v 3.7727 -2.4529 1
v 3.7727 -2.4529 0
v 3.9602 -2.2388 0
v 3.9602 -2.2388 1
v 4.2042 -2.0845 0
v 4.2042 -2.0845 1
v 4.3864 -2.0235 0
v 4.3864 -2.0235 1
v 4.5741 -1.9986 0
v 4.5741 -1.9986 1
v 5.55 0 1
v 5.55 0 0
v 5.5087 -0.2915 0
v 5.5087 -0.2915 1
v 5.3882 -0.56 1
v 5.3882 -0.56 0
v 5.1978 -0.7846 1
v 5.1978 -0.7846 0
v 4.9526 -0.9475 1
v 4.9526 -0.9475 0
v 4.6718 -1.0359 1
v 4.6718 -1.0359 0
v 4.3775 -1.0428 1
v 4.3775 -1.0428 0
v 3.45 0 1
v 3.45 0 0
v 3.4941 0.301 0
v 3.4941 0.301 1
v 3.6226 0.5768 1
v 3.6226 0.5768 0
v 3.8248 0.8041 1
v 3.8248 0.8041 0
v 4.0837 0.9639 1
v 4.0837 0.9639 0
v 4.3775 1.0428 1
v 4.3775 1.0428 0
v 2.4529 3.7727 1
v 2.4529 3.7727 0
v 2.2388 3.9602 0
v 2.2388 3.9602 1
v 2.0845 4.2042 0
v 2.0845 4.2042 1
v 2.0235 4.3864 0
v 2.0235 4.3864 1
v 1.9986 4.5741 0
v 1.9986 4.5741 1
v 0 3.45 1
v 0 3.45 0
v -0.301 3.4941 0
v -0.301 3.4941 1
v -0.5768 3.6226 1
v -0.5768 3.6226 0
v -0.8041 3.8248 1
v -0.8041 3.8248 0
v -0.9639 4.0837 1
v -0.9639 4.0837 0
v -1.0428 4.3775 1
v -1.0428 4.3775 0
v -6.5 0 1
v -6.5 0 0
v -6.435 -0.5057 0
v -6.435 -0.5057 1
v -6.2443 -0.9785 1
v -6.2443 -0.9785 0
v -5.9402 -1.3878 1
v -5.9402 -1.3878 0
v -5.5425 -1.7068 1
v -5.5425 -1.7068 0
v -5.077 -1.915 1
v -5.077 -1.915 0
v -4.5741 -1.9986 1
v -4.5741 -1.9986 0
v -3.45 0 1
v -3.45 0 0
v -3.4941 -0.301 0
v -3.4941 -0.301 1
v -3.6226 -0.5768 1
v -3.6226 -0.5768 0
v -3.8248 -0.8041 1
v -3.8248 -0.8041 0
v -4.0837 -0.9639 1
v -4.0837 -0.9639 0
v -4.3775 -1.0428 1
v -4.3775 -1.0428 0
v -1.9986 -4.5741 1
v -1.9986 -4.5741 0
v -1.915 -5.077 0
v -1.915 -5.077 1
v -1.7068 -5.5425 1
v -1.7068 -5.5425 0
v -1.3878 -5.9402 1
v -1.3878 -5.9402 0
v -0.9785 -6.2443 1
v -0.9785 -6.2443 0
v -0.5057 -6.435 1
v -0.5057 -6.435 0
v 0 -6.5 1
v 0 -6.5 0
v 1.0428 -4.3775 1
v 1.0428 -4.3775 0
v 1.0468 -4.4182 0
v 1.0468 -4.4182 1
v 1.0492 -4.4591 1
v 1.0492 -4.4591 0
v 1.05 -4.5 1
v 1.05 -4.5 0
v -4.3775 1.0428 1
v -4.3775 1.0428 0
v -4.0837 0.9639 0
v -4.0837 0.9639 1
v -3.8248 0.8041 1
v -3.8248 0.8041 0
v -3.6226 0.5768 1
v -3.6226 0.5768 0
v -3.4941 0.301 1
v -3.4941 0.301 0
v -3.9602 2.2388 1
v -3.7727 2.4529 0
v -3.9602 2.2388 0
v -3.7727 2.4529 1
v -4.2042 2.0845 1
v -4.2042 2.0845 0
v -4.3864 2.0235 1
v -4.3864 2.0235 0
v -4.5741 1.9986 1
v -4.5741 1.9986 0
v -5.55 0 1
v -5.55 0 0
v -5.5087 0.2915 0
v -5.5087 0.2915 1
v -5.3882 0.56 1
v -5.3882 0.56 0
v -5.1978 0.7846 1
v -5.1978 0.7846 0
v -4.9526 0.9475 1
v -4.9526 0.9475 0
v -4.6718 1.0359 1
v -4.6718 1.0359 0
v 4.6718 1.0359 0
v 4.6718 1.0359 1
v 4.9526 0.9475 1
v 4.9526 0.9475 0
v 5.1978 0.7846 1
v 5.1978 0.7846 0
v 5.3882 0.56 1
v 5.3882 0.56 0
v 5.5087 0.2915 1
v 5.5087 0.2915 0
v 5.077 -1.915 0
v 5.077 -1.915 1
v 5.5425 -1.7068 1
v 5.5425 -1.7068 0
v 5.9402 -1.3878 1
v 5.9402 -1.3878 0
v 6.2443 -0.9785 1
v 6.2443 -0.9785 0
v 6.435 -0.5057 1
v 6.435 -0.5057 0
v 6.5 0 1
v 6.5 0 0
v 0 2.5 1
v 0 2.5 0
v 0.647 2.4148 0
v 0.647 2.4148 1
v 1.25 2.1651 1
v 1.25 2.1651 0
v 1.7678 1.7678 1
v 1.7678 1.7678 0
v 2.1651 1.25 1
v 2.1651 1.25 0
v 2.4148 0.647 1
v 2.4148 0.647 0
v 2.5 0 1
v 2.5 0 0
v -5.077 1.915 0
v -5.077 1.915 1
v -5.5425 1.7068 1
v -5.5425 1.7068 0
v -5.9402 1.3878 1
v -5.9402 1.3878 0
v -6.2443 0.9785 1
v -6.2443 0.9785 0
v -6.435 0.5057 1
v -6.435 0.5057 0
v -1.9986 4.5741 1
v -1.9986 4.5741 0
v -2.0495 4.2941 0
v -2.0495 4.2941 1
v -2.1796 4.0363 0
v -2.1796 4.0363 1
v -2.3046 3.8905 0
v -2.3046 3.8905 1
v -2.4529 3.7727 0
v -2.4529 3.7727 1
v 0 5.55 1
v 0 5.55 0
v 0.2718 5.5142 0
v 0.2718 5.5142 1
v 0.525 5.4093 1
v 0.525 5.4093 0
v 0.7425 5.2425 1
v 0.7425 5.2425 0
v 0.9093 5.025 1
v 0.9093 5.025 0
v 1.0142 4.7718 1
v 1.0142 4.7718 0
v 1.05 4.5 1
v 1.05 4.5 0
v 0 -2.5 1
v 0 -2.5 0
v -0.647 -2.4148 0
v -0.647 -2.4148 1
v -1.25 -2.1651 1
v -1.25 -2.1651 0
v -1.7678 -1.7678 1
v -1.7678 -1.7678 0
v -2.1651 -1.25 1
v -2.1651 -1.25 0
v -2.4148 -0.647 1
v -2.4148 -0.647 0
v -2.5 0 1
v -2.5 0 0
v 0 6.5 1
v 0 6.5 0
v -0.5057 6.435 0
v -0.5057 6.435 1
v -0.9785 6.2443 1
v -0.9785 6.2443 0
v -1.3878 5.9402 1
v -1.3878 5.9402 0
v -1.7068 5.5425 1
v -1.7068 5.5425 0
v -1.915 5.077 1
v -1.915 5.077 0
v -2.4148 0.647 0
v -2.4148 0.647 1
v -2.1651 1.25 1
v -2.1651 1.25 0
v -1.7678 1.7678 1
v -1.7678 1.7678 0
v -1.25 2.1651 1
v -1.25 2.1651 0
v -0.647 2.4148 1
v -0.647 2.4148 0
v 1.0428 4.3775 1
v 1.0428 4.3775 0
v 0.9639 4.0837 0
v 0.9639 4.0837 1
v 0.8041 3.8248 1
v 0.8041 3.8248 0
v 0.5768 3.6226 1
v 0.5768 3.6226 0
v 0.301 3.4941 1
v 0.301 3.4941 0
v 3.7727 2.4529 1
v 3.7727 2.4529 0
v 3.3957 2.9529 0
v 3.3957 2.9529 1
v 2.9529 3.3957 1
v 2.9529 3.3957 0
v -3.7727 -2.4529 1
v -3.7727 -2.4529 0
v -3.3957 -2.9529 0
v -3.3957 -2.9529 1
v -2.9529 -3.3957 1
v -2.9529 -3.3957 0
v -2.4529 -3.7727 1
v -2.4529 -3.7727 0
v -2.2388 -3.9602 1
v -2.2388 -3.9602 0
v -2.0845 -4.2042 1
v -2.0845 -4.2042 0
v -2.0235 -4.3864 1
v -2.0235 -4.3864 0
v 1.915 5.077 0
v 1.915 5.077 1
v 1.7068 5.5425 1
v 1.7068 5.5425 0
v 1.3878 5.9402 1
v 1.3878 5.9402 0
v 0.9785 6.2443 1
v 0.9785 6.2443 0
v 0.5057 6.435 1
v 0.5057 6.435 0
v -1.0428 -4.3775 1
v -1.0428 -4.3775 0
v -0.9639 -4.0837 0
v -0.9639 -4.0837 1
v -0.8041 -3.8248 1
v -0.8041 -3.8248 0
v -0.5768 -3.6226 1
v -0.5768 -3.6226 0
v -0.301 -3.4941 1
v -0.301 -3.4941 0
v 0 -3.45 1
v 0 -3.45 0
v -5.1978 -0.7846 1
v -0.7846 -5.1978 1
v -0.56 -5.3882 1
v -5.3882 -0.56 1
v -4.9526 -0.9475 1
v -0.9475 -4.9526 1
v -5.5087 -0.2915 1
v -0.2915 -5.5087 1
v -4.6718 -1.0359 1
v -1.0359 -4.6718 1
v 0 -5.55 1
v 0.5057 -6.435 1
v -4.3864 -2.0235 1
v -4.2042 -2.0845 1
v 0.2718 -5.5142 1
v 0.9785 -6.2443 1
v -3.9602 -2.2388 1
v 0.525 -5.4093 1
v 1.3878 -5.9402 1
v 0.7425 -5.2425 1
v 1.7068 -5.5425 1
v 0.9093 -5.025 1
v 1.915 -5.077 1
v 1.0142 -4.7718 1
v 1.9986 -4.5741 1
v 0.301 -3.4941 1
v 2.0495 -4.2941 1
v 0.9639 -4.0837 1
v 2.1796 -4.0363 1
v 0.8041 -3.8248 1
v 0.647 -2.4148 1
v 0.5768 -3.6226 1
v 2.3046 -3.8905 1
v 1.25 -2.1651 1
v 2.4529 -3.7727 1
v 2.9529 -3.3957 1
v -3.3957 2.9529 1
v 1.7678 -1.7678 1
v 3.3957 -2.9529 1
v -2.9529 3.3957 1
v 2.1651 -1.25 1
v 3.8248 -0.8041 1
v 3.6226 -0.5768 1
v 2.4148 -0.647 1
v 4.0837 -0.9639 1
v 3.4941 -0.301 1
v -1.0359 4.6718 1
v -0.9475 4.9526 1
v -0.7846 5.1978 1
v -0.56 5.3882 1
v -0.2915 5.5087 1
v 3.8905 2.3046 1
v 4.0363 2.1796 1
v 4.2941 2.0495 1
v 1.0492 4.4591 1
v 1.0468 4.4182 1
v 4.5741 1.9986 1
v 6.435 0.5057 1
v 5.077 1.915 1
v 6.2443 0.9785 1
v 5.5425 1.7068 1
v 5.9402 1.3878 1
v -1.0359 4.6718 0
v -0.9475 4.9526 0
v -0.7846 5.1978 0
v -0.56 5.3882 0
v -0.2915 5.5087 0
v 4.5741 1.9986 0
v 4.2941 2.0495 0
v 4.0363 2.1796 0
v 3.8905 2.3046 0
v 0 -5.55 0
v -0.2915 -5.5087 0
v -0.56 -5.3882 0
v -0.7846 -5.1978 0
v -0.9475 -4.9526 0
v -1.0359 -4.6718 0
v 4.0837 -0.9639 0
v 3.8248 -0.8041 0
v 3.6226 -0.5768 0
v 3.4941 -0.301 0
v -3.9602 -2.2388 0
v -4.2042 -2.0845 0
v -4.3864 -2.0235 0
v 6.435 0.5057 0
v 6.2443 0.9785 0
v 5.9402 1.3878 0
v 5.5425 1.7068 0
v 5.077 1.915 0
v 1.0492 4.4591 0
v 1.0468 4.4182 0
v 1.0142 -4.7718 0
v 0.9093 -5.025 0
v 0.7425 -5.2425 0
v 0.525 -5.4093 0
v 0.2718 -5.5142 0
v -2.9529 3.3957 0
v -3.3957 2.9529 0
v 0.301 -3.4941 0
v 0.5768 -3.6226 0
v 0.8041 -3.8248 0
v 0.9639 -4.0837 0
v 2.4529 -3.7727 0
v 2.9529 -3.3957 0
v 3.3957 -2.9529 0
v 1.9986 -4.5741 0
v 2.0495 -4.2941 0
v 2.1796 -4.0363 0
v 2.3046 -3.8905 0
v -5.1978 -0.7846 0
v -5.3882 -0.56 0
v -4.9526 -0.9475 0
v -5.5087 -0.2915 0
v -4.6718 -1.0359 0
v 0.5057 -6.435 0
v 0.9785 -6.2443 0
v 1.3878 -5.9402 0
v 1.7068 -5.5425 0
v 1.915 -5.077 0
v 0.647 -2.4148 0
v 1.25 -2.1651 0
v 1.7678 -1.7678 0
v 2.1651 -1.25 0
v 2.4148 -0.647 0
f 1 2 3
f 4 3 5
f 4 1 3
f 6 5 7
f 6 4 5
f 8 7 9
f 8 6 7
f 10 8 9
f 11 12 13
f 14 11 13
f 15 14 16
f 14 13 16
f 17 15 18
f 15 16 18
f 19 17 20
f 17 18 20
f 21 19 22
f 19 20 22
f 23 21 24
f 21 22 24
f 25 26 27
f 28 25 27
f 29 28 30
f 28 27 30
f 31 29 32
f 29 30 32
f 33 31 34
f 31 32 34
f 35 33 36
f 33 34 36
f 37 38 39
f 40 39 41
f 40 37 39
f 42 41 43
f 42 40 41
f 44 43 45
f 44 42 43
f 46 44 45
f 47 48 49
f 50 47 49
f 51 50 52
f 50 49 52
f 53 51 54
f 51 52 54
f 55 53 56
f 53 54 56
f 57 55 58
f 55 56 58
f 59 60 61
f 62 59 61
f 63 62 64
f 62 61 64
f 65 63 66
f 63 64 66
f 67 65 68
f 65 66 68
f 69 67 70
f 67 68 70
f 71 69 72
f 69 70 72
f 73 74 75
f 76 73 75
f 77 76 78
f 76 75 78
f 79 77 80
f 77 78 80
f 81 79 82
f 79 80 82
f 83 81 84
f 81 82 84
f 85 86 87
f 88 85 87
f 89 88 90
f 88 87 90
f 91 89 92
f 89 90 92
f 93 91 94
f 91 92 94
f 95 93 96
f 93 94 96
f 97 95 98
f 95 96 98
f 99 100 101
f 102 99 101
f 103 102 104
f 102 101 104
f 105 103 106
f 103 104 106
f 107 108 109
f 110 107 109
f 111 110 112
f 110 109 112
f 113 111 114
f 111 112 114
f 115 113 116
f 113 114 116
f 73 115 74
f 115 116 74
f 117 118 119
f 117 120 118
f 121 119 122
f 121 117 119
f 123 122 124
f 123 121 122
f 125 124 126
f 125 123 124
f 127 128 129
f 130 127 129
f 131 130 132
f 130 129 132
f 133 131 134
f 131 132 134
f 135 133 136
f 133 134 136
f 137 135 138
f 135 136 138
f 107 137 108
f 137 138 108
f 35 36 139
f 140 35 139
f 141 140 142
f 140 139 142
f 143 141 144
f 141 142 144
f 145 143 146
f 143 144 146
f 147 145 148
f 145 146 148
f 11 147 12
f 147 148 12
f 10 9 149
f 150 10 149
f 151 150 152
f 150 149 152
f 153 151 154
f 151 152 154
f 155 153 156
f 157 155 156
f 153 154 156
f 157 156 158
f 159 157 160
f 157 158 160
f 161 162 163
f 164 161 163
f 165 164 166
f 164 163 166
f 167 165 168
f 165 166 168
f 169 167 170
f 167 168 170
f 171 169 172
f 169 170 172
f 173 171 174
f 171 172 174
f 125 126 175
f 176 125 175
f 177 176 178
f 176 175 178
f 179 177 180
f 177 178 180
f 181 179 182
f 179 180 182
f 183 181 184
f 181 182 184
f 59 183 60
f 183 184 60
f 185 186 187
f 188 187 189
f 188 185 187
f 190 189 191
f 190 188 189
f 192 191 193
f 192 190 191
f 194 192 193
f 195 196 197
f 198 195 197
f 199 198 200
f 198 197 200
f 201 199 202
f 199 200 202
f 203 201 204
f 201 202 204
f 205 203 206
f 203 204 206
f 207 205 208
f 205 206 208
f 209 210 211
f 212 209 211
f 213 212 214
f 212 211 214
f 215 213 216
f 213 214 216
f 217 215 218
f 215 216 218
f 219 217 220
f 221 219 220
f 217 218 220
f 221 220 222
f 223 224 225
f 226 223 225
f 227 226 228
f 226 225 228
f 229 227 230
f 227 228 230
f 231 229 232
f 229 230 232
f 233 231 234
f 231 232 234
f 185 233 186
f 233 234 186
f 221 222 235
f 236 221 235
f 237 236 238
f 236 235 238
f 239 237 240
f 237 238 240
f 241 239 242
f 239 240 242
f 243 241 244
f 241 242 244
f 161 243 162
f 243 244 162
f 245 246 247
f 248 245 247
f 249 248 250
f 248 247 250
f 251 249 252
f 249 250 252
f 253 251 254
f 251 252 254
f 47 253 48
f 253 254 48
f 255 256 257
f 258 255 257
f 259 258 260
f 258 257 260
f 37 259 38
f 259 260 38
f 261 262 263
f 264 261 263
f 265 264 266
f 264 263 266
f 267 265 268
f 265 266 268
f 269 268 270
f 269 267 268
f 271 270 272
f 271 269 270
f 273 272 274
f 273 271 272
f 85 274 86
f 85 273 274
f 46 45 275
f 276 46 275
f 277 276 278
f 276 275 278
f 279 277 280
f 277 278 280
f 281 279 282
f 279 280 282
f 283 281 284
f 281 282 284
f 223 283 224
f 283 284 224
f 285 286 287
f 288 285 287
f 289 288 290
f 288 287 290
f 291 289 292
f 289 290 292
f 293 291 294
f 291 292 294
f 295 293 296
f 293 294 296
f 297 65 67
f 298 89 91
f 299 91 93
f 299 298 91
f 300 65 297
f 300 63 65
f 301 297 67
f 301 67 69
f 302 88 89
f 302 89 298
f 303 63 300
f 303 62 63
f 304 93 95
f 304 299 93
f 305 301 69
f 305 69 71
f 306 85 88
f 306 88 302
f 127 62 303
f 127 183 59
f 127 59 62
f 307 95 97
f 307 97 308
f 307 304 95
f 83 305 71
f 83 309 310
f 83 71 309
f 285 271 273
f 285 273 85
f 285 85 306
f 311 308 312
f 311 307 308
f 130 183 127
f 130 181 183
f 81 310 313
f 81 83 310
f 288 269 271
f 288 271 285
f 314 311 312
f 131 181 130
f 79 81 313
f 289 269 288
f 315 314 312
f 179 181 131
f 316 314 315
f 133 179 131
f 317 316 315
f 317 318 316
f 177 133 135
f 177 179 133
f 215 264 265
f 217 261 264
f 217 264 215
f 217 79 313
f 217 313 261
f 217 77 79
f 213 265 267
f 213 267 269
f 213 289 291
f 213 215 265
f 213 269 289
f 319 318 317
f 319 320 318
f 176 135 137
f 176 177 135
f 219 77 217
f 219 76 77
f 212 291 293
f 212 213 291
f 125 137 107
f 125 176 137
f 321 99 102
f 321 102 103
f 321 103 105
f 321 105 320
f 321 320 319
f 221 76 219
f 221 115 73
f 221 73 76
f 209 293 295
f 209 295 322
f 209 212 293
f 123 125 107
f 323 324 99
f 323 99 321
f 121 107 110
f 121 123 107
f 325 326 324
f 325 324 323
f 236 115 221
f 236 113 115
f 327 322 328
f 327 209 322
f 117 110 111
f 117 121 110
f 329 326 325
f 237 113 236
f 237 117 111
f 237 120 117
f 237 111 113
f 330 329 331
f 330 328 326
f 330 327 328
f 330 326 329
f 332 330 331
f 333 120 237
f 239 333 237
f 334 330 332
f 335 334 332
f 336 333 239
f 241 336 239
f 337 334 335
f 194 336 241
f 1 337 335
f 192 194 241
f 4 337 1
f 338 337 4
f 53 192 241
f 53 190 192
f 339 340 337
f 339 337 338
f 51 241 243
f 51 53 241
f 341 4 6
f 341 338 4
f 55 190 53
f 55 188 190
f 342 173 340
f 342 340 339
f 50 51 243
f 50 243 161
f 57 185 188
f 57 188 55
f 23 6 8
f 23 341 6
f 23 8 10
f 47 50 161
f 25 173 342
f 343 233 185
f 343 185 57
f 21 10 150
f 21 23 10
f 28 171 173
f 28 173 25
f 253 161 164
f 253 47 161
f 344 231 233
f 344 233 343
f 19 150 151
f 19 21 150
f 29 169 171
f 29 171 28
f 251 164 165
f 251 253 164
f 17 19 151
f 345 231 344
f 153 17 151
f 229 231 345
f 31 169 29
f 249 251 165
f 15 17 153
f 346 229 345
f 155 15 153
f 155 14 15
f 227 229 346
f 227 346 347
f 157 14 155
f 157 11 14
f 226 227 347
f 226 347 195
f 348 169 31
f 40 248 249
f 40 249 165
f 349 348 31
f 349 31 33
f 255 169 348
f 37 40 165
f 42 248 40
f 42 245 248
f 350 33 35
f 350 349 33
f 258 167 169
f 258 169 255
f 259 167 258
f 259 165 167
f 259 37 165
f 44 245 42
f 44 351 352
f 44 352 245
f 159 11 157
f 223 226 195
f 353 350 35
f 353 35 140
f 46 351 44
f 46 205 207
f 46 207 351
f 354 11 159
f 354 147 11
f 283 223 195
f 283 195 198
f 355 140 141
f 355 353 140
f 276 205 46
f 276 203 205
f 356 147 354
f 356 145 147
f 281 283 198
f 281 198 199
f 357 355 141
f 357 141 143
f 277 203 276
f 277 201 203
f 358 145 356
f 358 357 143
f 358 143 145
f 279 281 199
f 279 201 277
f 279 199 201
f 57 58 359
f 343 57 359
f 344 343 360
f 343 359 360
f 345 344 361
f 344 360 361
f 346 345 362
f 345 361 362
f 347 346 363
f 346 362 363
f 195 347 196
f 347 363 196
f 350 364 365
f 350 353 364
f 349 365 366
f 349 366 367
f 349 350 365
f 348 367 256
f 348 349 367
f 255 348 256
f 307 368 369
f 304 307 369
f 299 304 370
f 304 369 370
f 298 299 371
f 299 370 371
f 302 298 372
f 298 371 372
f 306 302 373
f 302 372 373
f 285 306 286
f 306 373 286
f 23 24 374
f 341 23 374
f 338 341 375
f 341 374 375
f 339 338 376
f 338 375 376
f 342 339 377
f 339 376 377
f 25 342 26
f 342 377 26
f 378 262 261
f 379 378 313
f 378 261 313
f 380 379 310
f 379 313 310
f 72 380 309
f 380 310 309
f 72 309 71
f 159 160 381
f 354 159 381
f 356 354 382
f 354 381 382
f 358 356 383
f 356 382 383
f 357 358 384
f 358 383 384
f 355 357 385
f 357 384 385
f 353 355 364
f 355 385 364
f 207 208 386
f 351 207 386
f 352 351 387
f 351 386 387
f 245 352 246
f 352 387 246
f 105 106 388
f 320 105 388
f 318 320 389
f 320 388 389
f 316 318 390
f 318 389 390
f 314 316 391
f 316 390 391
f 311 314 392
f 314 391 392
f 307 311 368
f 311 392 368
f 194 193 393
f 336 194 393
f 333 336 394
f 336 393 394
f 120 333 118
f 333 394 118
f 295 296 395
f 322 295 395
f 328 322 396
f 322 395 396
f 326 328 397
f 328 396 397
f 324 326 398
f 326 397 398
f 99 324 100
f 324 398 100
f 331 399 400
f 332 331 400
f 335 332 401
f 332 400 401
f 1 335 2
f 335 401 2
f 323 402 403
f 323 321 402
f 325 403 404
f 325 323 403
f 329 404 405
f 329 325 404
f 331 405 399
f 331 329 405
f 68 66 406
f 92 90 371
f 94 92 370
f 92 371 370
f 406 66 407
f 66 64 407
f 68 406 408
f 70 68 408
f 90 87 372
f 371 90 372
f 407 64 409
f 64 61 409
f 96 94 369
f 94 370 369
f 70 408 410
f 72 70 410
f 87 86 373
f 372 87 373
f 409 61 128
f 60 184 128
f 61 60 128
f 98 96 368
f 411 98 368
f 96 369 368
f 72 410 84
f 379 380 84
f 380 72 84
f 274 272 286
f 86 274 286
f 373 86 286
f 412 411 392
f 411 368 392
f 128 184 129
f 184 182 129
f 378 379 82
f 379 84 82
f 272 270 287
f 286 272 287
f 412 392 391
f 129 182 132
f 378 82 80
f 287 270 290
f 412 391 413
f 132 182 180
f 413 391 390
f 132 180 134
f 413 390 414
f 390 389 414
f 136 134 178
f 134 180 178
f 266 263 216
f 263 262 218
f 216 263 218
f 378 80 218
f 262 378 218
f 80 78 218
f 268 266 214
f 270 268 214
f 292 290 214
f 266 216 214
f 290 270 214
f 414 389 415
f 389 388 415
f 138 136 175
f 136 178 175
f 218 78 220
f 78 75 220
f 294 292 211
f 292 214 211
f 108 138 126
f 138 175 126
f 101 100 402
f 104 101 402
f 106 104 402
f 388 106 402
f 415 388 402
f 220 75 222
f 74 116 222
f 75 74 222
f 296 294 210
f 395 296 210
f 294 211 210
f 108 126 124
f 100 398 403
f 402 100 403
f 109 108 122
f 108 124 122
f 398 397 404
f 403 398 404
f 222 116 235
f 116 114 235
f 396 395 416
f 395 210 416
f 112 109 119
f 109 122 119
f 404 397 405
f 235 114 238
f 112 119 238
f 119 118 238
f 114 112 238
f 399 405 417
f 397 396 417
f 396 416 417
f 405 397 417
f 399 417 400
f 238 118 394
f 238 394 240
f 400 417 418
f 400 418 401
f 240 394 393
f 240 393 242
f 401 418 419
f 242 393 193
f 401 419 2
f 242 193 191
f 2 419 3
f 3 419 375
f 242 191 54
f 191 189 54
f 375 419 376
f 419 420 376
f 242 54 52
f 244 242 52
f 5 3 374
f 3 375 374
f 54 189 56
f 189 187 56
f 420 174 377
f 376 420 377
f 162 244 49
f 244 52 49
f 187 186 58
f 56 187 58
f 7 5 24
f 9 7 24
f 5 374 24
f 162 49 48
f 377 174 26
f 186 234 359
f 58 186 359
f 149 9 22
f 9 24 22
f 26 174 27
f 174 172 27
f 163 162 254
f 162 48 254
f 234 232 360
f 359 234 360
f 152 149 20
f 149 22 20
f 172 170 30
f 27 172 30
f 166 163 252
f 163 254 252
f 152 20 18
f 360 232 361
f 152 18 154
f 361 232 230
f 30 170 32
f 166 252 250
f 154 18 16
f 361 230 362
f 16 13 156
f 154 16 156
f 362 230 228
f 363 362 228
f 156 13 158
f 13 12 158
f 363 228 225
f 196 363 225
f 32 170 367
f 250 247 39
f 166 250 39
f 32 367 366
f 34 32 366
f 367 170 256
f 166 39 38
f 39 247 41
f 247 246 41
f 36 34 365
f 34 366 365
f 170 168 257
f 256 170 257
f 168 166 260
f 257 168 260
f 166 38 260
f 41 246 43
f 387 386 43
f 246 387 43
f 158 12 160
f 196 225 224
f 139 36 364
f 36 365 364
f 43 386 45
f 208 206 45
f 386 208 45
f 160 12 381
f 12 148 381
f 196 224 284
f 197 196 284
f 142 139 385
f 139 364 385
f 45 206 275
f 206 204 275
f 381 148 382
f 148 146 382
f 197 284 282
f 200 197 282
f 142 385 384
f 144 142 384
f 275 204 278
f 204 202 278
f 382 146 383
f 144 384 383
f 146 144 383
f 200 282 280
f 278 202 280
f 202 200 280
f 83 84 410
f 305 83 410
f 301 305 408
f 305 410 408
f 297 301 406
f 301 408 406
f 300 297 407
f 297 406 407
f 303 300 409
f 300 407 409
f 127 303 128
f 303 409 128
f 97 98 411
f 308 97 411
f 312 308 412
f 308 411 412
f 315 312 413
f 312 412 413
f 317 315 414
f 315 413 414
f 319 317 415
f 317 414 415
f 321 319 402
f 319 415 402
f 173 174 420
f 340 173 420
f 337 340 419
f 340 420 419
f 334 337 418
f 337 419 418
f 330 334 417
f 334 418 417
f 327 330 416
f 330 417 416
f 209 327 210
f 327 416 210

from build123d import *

# Parameters (mm, degrees)
F1_DEPTH = 1
F2_R     = 1


with BuildPart() as f1:
    # F0 (on Top) → F1 (new body)
    with BuildSketch(Plane.XY):
        with BuildLine():
            ThreePointArc((-2.5, 0), (-1.767766953, 1.767766953), (0, 2.5))
            ThreePointArc((0, 2.5), (-1.2472191289, 2.9365280801), (-1.9499920861, 4.0555555556))
            ThreePointArc((-1.9499920861, 4.0555555556), (-3.1819805153, 3.1819805153), (-4.0555555556, 1.9499920861))
            ThreePointArc((-4.0555555556, 1.9499920861), (-2.9365280801, 1.2472191289), (-2.5, 0))
        make_face()
        with BuildLine():
            Line((-3.45, 0), (-2.5, 0))
            ThreePointArc((-2.5, 0), (-2.9365280801, 1.2472191289), (-4.0555555556, 1.9499920861))
            ThreePointArc((-4.0555555556, 1.9499920861), (-4.2408539714, 1.5050440503), (-4.3775, 1.0428296841))
            ThreePointArc((-4.3775, 1.0428296841), (-3.715422088, 0.6978090713), (-3.45, 0))
        make_face()
        with BuildLine():
            ThreePointArc((-4.0555555556, -1.9499920861), (-2.9365280801, -1.2472191289), (-2.5, 0))
            Line((-2.5, 0), (-3.45, 0))
            ThreePointArc((-3.45, 0), (-3.715422088, -0.6978090713), (-4.3775, -1.0428296841))
            ThreePointArc((-4.3775, -1.0428296841), (-4.2408539714, -1.5050440503), (-4.0555555556, -1.9499920861))
        make_face()
        with BuildLine():
            ThreePointArc((-1.9499920861, -4.0555555556), (-1.2472191276, -2.936528079), (3.3e-09, -2.5))
            ThreePointArc((3.3e-09, -2.5), (-1.7677669518, -1.7677669542), (-2.5, 0))
            ThreePointArc((-2.5, 0), (-2.9365280801, -1.2472191289), (-4.0555555556, -1.9499920861))
            ThreePointArc((-4.0555555556, -1.9499920861), (-3.1819805153, -3.1819805153), (-1.9499920861, -4.0555555556))
        make_face()
        with BuildLine():
            ThreePointArc((4.0555555556, -1.9499920861), (2.9365280801, -1.2472191289), (2.5, 0))
            ThreePointArc((2.5, 0), (1.7677669542, -1.7677669518), (3.3e-09, -2.5))
            ThreePointArc((3.3e-09, -2.5), (1.2472191302, -2.9365280811), (1.9499920861, -4.0555555556))
            ThreePointArc((1.9499920861, -4.0555555556), (3.1819805153, -3.1819805153), (4.0555555556, -1.9499920861))
        make_face()
        with BuildLine():
            Line((3.45, 0), (2.5, 0))
            ThreePointArc((2.5, 0), (2.9365280801, -1.2472191289), (4.0555555556, -1.9499920861))
            ThreePointArc((4.0555555556, -1.9499920861), (4.2408539714, -1.5050440503), (4.3775, -1.0428296841))
            ThreePointArc((4.3775, -1.0428296841), (3.715422088, -0.6978090713), (3.45, 0))
        make_face()
        with BuildLine():
            ThreePointArc((4.0555555556, 1.9499920861), (2.9365280801, 1.2472191289), (2.5, 0))
            Line((2.5, 0), (3.45, 0))
            ThreePointArc((3.45, 0), (3.715422088, 0.6978090713), (4.3775, 1.0428296841))
            ThreePointArc((4.3775, 1.0428296841), (4.2408539714, 1.5050440503), (4.0555555556, 1.9499920861))
        make_face()
        with BuildLine():
            ThreePointArc((0, 2.5), (1.767766953, 1.767766953), (2.5, 0))
            ThreePointArc((2.5, 0), (2.9365280801, 1.2472191289), (4.0555555556, 1.9499920861))
            ThreePointArc((4.0555555556, 1.9499920861), (3.1819805153, 3.1819805153), (1.9499920861, 4.0555555556))
            ThreePointArc((1.9499920861, 4.0555555556), (1.2472191289, 2.9365280801), (0, 2.5))
        make_face()
        with BuildLine():
            Line((0, 3.45), (0, 2.5))
            ThreePointArc((0, 2.5), (1.2472191289, 2.9365280801), (1.9499920861, 4.0555555556))
            ThreePointArc((1.9499920861, 4.0555555556), (1.5050440503, 4.2408539714), (1.0428296841, 4.3775))
            ThreePointArc((1.0428296841, 4.3775), (0.6978090713, 3.715422088), (0, 3.45))
        make_face()
        with BuildLine():
            ThreePointArc((-1.9499920861, 4.0555555556), (-1.2472191289, 2.9365280801), (0, 2.5))
            Line((0, 2.5), (0, 3.45))
            ThreePointArc((0, 3.45), (-0.6978090713, 3.715422088), (-1.0428296841, 4.3775))
            ThreePointArc((-1.0428296841, 4.3775), (-1.5050440503, 4.2408539714), (-1.9499920861, 4.0555555556))
        make_face()
        with BuildLine():
            ThreePointArc((0, 6.5), (-1.5634719199, 5.7472191289), (-1.9499920861, 4.0555555556))
            ThreePointArc((-1.9499920861, 4.0555555556), (-1.5050440503, 4.2408539714), (-1.0428296841, 4.3775))
            ThreePointArc((-1.0428296841, 4.3775), (-0.784577912, 5.1978090713), (0, 5.55))
            Line((0, 5.55), (0, 6.5))
        make_face()
        with BuildLine():
            ThreePointArc((1.0428296841, 4.3775), (1.5050440503, 4.2408539714), (1.9499920861, 4.0555555556))
            ThreePointArc((1.9499920861, 4.0555555556), (1.9874587005, 4.2763755069), (2, 4.5))
            ThreePointArc((2, 4.5), (1.4142135624, 5.9142135624), (0, 6.5))
            Line((0, 6.5), (0, 5.55))
            ThreePointArc((0, 5.55), (0.7424621202, 5.2424621202), (1.05, 4.5))
            ThreePointArc((1.05, 4.5), (1.0482058882, 4.4386451644), (1.0428296841, 4.3775))
        make_face()
        with BuildLine():
            ThreePointArc((6.5, 0), (5.7472191289, 1.5634719199), (4.0555555556, 1.9499920861))
            ThreePointArc((4.0555555556, 1.9499920861), (4.2408539714, 1.5050440503), (4.3775, 1.0428296841))
            ThreePointArc((4.3775, 1.0428296841), (5.1978090713, 0.784577912), (5.55, 0))
            Line((5.55, 0), (6.5, 0))
        make_face()
        with BuildLine():
            ThreePointArc((4.3775, -1.0428296841), (4.2408539714, -1.5050440503), (4.0555555556, -1.9499920861))
            ThreePointArc((4.0555555556, -1.9499920861), (5.7472191289, -1.5634719199), (6.5, 0))
            Line((6.5, 0), (5.55, 0))
            ThreePointArc((5.55, 0), (5.1978090713, -0.784577912), (4.3775, -1.0428296841))
        make_face()
        with BuildLine():
            ThreePointArc((1.9499920861, -4.0555555556), (1.2472191302, -2.9365280811), (3.3e-09, -2.5))
            Line((0, -2.5), (0, -3.45))
            ThreePointArc((0, -3.45), (0.6978090713, -3.715422088), (1.0428296841, -4.3775))
            ThreePointArc((1.0428296841, -4.3775), (1.5050440503, -4.2408539714), (1.9499920861, -4.0555555556))
        make_face()
        with BuildLine():
            Line((0, -3.45), (0, -2.5))
            ThreePointArc((3.3e-09, -2.5), (-1.2472191276, -2.936528079), (-1.9499920861, -4.0555555556))
            ThreePointArc((-1.9499920861, -4.0555555556), (-1.5050440503, -4.2408539714), (-1.0428296841, -4.3775))
            ThreePointArc((-1.0428296841, -4.3775), (-0.6978090713, -3.715422088), (0, -3.45))
        make_face()
        with BuildLine():
            ThreePointArc((-1.0428296841, -4.3775), (-1.5050440503, -4.2408539714), (-1.9499920861, -4.0555555556))
            ThreePointArc((-1.9499920861, -4.0555555556), (-1.5634719204, -5.7472191284), (-1.3e-09, -6.5))
            Line((0, -6.5), (0, -5.55))
            ThreePointArc((0, -5.55), (-0.784577912, -5.1978090713), (-1.0428296841, -4.3775))
        make_face()
        with BuildLine():
            ThreePointArc((2, -4.5), (1.9874587005, -4.2763755069), (1.9499920861, -4.0555555556))
            ThreePointArc((1.9499920861, -4.0555555556), (1.5050440503, -4.2408539714), (1.0428296841, -4.3775))
            ThreePointArc((1.0428296841, -4.3775), (1.0482058882, -4.4386451644), (1.05, -4.5))
            ThreePointArc((1.05, -4.5), (0.7424621202, -5.2424621202), (0, -5.55))
            Line((0, -5.55), (0, -6.5))
            ThreePointArc((-1.3e-09, -6.5), (1.4142135619, -5.9142135628), (2, -4.5))
        make_face()
        with BuildLine():
            ThreePointArc((-6.5, 2.4e-09), (-5.7472191299, -1.5634719192), (-4.0555555556, -1.9499920861))
            ThreePointArc((-4.0555555556, -1.9499920861), (-4.2408539714, -1.5050440503), (-4.3775, -1.0428296841))
            ThreePointArc((-4.3775, -1.0428296841), (-5.1978090713, -0.784577912), (-5.55, 0))
            Line((-5.55, 0), (-6.5, 0))
        make_face()
        with BuildLine():
            ThreePointArc((-4.3775, 1.0428296841), (-4.2408539714, 1.5050440503), (-4.0555555556, 1.9499920861))
            ThreePointArc((-4.0555555556, 1.9499920861), (-5.747219128, 1.5634719207), (-6.5, 2.4e-09))
            Line((-6.5, 0), (-5.55, 0))
            ThreePointArc((-5.55, 0), (-5.1978090713, 0.784577912), (-4.3775, 1.0428296841))
        make_face()
    extrude(amount=F1_DEPTH)

    # F2
    f2_edges = [f1.edges().sort_by_distance(p)[0] for p in [
        (-4.055556, 1.949992, 0.5),
        (-1.949992, 4.055556, 0.5),
        (1.949992, 4.055556, 0.5),
        (4.055556, 1.949992, 0.5),
        (4.055556, -1.949992, 0.5),
        (1.949992, -4.055556, 0.5),
        (-1.949992, -4.055556, 0.5),
        (-4.055556, -1.949992, 0.5),
    ]]
    fillet(f2_edges, radius=F2_R)


solid = f1.part
